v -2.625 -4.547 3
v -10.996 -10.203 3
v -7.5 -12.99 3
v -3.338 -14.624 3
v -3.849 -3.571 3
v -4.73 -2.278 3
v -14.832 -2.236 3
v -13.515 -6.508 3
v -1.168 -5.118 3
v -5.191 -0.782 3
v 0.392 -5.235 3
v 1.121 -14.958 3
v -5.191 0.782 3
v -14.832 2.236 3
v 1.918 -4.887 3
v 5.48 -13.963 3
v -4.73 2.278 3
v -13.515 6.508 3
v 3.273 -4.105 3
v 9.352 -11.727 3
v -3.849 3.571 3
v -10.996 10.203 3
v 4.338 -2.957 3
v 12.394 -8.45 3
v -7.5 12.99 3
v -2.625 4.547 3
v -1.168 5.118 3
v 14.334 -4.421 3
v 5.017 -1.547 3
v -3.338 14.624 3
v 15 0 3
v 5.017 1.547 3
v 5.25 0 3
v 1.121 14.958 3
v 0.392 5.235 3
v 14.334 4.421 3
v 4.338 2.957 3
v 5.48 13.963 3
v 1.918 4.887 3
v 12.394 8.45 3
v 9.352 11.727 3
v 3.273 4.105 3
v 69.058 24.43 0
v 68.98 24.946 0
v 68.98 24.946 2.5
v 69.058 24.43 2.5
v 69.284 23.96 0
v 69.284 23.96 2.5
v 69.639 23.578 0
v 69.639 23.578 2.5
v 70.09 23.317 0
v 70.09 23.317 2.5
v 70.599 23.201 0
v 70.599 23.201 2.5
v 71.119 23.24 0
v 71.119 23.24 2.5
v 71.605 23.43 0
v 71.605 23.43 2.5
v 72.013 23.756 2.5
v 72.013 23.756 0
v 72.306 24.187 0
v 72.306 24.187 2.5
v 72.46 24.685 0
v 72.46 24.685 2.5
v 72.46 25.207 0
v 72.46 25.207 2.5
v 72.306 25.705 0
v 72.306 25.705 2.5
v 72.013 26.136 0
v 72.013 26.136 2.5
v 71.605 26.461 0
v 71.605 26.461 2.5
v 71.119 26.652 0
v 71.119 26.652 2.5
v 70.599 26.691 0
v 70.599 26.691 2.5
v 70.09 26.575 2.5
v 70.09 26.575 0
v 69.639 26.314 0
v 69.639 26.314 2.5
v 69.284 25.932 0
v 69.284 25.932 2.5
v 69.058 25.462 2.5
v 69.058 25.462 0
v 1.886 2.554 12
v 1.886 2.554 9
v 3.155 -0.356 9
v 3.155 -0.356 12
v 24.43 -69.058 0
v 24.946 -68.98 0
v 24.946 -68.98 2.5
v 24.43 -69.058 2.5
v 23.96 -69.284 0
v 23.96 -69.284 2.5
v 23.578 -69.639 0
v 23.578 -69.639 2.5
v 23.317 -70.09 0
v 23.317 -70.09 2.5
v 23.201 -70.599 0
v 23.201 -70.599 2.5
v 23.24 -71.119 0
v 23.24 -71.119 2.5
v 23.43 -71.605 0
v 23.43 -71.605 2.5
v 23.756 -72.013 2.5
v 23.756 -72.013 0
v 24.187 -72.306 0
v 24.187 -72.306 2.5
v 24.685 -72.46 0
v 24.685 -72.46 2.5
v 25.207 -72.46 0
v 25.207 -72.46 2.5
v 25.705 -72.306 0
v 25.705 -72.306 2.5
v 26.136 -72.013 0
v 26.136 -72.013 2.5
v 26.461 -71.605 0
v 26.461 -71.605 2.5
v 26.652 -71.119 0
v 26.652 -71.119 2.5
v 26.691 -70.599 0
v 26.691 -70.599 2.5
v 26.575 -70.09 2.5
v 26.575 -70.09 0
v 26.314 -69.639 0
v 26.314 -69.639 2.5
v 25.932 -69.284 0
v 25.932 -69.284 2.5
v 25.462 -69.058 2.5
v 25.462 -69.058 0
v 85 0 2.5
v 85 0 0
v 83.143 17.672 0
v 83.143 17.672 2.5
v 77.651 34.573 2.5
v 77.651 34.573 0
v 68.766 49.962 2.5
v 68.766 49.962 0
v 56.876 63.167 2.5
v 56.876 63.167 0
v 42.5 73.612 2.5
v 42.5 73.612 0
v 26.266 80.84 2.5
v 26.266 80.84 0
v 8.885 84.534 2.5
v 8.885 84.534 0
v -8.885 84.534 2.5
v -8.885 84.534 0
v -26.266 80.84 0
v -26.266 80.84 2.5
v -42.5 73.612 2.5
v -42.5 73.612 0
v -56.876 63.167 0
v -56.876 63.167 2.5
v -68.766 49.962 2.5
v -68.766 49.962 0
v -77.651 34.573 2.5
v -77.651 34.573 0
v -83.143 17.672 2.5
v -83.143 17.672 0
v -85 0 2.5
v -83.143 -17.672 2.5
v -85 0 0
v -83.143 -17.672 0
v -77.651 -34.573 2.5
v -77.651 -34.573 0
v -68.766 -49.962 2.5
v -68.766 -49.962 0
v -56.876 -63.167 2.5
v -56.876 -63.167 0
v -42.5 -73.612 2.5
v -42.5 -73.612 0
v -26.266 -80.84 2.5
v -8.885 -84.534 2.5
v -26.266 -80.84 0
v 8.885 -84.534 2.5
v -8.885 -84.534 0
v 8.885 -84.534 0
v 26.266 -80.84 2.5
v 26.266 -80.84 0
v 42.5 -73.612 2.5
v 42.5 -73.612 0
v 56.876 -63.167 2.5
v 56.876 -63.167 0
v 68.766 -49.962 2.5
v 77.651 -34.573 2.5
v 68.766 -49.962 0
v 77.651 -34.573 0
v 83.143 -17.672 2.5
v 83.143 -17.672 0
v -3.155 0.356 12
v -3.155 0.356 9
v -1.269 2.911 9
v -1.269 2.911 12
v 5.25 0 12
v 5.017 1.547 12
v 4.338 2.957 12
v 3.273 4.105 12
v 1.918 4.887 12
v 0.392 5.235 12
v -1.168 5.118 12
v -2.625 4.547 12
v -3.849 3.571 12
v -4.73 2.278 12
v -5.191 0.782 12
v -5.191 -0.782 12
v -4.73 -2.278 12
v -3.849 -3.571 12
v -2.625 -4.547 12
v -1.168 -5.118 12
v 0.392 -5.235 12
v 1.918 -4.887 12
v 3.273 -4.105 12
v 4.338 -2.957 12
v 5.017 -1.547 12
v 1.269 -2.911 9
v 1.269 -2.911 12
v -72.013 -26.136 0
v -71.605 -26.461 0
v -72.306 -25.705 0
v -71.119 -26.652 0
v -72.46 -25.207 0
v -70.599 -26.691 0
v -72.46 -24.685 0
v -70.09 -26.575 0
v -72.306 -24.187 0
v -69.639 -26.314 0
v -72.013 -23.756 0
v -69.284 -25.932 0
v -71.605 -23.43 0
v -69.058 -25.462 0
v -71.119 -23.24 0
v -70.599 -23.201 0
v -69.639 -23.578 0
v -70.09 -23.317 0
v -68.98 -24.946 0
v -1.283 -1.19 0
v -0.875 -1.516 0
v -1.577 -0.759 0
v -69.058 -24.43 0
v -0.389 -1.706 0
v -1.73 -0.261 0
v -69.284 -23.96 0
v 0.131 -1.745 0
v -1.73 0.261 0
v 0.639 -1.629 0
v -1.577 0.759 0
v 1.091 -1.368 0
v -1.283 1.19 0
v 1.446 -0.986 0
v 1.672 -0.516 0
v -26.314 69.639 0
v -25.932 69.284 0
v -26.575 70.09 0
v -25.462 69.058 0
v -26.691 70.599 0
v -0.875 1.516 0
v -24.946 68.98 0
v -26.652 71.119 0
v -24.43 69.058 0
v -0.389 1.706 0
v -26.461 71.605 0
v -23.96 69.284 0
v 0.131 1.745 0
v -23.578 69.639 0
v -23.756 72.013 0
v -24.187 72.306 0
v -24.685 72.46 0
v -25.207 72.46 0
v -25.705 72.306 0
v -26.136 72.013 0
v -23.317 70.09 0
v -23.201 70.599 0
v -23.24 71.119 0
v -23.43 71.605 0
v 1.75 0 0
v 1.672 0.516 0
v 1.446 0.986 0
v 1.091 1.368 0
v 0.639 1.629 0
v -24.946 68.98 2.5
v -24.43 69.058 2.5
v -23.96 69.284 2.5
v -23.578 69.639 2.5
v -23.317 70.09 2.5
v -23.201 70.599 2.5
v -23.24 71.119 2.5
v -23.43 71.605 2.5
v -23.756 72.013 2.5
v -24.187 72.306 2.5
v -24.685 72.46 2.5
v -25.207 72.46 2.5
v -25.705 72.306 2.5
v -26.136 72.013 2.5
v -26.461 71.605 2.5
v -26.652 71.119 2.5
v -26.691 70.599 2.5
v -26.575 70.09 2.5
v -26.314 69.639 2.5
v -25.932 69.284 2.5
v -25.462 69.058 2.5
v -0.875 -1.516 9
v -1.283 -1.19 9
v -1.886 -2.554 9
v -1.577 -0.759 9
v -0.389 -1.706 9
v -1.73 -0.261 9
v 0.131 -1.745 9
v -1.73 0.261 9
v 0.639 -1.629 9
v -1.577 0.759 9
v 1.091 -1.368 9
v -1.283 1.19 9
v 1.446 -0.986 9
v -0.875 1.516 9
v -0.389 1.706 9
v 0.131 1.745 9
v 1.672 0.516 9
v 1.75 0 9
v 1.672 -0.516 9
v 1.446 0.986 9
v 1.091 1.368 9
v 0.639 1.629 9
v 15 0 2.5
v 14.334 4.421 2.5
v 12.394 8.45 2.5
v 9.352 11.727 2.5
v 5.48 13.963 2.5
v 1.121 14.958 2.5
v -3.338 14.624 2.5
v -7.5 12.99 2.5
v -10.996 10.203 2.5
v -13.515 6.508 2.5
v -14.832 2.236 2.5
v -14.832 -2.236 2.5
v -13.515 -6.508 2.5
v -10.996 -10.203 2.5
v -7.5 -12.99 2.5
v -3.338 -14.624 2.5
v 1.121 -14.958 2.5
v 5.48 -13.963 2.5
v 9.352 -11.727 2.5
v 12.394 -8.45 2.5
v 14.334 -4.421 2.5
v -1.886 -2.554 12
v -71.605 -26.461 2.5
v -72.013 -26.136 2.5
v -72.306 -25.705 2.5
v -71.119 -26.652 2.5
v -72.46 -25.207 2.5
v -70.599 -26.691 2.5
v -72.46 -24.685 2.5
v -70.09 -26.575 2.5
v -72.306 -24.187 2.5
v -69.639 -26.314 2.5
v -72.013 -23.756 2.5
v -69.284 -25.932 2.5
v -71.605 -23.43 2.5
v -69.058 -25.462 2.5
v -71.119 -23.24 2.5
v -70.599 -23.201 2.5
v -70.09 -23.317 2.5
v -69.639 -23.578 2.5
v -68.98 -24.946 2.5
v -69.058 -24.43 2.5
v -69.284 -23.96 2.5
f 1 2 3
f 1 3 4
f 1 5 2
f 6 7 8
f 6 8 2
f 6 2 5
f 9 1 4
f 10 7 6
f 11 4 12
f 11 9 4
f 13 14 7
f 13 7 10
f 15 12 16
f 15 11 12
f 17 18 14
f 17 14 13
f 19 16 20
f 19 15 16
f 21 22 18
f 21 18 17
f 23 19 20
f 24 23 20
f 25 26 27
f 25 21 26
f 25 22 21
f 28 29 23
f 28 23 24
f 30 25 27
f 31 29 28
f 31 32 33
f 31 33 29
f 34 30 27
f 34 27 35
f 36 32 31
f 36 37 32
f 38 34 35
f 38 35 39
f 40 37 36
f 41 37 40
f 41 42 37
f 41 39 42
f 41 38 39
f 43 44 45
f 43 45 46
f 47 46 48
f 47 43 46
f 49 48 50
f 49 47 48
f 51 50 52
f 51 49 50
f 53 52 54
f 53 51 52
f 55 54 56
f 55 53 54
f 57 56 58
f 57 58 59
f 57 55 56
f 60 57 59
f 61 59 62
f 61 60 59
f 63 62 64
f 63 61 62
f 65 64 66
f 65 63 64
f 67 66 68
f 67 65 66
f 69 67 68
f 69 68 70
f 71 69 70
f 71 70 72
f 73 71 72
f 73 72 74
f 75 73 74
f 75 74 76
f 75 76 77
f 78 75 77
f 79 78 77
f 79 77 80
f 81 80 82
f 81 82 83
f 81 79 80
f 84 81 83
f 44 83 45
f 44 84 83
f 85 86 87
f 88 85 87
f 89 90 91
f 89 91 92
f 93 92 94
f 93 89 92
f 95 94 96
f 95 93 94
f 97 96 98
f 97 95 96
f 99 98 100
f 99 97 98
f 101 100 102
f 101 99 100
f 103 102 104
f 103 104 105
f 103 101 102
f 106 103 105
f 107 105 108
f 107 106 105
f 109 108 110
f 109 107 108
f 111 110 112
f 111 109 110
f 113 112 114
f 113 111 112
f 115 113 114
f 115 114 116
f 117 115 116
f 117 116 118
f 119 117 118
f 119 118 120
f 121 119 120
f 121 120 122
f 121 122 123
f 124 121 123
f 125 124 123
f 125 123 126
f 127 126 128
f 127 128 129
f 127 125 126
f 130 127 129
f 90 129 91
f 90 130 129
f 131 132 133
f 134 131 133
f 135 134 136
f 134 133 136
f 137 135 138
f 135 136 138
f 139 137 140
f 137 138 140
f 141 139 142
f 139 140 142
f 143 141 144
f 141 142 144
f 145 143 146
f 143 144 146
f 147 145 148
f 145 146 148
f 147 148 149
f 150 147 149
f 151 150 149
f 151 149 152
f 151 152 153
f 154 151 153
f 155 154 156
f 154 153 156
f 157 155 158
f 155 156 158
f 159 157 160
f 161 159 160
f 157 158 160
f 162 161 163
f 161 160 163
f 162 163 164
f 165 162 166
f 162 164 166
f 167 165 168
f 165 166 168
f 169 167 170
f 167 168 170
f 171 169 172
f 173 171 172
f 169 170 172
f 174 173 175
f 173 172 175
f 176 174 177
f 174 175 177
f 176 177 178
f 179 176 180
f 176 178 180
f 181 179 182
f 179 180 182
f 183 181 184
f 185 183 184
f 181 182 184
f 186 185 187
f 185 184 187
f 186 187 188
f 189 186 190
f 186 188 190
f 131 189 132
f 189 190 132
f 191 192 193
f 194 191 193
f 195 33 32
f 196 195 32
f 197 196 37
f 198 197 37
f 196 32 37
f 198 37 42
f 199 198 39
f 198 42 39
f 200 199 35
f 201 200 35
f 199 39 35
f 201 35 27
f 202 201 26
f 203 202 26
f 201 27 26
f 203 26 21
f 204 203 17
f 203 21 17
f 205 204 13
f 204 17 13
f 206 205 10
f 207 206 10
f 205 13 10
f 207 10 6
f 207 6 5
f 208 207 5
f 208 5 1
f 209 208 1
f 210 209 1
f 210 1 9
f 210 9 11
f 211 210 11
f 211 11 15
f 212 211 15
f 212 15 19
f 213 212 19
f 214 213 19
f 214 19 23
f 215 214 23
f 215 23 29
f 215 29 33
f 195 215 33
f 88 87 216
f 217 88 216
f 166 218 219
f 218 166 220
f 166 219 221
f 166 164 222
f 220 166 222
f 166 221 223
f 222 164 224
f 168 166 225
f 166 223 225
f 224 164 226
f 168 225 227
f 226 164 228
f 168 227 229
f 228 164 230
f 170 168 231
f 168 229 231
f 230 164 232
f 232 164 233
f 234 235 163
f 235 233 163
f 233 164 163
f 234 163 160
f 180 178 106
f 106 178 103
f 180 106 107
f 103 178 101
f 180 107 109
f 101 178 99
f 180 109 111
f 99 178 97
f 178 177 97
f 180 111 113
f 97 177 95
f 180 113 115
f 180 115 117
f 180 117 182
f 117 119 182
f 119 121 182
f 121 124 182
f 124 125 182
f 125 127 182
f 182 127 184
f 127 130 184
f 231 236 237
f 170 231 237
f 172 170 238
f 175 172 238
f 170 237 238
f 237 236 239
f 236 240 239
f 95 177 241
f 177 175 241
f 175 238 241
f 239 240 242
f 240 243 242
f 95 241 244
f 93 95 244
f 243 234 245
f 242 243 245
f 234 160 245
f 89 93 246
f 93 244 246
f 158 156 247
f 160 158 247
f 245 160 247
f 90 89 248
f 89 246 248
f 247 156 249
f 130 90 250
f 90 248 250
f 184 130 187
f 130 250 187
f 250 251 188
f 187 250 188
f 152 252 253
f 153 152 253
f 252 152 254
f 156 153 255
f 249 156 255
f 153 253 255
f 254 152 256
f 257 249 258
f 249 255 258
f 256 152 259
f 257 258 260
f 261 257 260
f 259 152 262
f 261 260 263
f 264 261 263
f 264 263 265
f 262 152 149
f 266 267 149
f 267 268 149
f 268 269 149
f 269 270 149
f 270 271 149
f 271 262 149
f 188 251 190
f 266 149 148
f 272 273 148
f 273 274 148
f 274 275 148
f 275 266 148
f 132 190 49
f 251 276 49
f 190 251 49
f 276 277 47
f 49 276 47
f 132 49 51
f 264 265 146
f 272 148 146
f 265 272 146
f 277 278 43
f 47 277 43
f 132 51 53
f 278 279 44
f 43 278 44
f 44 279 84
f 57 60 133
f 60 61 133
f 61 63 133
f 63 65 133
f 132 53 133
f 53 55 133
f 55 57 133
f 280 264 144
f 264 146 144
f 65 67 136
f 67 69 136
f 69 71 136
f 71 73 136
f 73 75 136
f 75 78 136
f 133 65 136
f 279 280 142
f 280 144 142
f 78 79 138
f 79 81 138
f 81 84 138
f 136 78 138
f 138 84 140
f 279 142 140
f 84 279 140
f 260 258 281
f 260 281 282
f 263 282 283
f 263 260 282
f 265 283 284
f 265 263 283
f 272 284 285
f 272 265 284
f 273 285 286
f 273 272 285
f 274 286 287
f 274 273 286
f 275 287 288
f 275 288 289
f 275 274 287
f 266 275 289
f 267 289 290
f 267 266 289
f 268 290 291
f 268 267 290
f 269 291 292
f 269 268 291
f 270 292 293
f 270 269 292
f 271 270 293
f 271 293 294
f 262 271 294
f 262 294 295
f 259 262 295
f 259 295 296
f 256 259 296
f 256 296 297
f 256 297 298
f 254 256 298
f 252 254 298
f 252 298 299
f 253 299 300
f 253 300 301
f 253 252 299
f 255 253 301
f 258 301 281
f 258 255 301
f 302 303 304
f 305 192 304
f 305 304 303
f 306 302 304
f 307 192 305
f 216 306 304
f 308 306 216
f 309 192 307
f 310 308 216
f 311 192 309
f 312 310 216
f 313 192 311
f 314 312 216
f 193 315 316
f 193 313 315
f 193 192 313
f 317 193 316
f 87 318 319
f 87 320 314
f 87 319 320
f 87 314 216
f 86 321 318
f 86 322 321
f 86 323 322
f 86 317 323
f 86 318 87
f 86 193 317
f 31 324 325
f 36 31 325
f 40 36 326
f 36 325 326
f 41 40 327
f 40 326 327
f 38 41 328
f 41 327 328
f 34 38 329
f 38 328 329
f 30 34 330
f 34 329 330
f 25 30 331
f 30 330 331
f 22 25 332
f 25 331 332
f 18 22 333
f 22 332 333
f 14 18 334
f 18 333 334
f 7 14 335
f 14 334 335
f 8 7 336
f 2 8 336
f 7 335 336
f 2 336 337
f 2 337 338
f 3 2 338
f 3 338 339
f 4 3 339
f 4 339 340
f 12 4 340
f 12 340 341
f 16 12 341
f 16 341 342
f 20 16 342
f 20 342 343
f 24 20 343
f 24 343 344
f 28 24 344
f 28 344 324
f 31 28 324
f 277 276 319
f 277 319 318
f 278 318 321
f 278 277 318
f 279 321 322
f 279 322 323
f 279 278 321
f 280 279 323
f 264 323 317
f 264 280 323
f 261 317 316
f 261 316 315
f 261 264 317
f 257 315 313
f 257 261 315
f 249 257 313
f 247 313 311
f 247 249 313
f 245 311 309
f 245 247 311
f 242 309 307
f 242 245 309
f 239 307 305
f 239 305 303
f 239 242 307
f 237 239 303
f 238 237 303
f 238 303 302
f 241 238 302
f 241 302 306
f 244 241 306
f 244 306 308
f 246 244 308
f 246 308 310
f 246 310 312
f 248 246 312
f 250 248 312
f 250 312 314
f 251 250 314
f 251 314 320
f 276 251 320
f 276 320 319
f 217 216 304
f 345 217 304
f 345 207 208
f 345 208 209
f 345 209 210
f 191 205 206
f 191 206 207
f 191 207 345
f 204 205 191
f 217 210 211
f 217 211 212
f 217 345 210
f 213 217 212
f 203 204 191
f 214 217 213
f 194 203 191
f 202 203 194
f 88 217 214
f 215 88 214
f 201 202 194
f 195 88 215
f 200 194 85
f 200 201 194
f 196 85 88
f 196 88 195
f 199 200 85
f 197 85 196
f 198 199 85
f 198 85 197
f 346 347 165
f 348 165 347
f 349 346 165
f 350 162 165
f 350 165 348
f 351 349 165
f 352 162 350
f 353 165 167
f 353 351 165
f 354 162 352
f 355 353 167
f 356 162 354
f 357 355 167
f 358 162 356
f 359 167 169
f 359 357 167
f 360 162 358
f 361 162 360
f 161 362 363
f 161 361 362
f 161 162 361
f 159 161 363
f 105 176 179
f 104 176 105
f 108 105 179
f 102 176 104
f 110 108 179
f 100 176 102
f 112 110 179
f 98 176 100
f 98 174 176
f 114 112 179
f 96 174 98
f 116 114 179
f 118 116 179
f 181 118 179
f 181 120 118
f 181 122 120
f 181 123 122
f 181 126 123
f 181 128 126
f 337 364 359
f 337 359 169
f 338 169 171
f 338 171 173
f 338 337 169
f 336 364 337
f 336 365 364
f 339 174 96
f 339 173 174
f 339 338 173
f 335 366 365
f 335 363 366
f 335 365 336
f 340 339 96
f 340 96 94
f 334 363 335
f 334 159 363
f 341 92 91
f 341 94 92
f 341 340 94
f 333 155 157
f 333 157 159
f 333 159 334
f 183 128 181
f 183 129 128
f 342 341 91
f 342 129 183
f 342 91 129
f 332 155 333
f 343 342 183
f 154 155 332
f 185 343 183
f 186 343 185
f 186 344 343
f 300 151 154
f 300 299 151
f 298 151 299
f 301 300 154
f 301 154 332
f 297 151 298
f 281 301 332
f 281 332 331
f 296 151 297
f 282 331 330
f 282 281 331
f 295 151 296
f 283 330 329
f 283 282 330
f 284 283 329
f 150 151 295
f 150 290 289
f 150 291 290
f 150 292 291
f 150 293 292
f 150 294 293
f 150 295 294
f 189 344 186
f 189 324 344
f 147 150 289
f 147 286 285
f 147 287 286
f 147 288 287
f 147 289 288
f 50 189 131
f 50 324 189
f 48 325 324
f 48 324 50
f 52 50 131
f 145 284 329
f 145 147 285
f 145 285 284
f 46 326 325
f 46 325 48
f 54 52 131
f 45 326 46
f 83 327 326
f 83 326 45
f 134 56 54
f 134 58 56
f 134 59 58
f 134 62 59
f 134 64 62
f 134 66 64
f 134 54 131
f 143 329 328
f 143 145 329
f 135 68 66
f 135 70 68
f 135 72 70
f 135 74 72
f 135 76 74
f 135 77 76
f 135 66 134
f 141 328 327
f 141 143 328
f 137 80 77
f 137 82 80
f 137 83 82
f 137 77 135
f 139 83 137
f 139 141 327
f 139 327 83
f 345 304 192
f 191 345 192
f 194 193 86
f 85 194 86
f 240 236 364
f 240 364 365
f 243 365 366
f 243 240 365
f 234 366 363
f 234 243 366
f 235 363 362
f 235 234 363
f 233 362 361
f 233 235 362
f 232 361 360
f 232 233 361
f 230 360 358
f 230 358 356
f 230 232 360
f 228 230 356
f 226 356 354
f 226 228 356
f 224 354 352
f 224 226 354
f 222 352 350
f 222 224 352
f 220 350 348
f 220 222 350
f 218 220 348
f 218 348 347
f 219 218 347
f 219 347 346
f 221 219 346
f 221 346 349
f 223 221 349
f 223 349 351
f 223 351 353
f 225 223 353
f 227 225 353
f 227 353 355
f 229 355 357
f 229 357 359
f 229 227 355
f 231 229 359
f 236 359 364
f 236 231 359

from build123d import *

# Parameters (mm, degrees)
F0_R            = 85
F0_R_2          = 1.75
F0_R_3          = 15
F0_R_4          = 5.25
F1_DEPTH        = 2.5
F2_DEPTH        = 2.5
F2_COPIES_COUNT = 4
F3_DEPTH        = 12
F4_DEPTH        = 9
F5_DEPTH        = 3


# Not quite as in the source:
# - a pattern or mirror of a feature is missing from the dataset's text; its kind, count and spacing are read off the source's solid


with BuildPart() as f1:
    # F0 (on Top) → F1 (new body)
    with BuildSketch(Plane.XY):
        Circle(F0_R)
        with Locations((-70.7297637461, -24.9459519848)):
            Circle(F0_R_2, mode=Mode.SUBTRACT)
        Circle(F0_R_3, mode=Mode.SUBTRACT)
        Circle(F0_R_3)
        Circle(F0_R_4, mode=Mode.SUBTRACT)
        Circle(F0_R_4)
        Polygon((-1.2691337593, 2.9107787333), (1.8862414482, 2.554491443), (3.1553752075, -0.3562872903), (1.2691337593, -2.9107787333), (-1.8862414482, -2.554491443), (-3.1553752075, 0.3562872903), align=None, mode=Mode.SUBTRACT)
        Polygon((3.1553752075, -0.3562872903), (1.8862414482, 2.554491443), (-1.2691337593, 2.9107787333), (-3.1553752075, 0.3562872903), (-1.8862414482, -2.554491443), (1.2691337593, -2.9107787333), align=None)
        Circle(F0_R_2, mode=Mode.SUBTRACT)
        with Locations((-70.7297637461, -24.9459519848)):
            Circle(F0_R_2)
    extrude(amount=F1_DEPTH)

    # F0 (on Top) → F2 (cut, through all)
    with BuildSketch(Plane.XY):
        with Locations((-70.7297637461, -24.9459519848)):
            Circle(F0_R_2)
    f2 = extrude(amount=F2_DEPTH, mode=Mode.SUBTRACT)

    # F2_copies: F2 ×4 about axis
    f2_copies_axis = Axis((0, 0, 0), (0, 0, 1))
    for i in range(1, F2_COPIES_COUNT):
        add(f2.rotate(f2_copies_axis, i * 360 / F2_COPIES_COUNT), mode=Mode.SUBTRACT)

    # F0 (on Top) → F3 (join)
    with BuildSketch(Plane.XY):
        Circle(F0_R_4)
        Polygon((-1.2691337593, 2.9107787333), (1.8862414482, 2.554491443), (3.1553752075, -0.3562872903), (1.2691337593, -2.9107787333), (-1.8862414482, -2.554491443), (-3.1553752075, 0.3562872903), align=None, mode=Mode.SUBTRACT)
    extrude(amount=F3_DEPTH)

    # F0 (on Top) → F4 (join)
    with BuildSketch(Plane.XY):
        Polygon((3.1553752075, -0.3562872903), (1.8862414482, 2.554491443), (-1.2691337593, 2.9107787333), (-3.1553752075, 0.3562872903), (-1.8862414482, -2.554491443), (1.2691337593, -2.9107787333), align=None)
        Circle(F0_R_2, mode=Mode.SUBTRACT)
    extrude(amount=F4_DEPTH)

    # F0 (on Top) → F5 (join)
    with BuildSketch(Plane.XY):
        Circle(F0_R_3)
        Circle(F0_R_4, mode=Mode.SUBTRACT)
    extrude(amount=F5_DEPTH)


solid = f1.part
